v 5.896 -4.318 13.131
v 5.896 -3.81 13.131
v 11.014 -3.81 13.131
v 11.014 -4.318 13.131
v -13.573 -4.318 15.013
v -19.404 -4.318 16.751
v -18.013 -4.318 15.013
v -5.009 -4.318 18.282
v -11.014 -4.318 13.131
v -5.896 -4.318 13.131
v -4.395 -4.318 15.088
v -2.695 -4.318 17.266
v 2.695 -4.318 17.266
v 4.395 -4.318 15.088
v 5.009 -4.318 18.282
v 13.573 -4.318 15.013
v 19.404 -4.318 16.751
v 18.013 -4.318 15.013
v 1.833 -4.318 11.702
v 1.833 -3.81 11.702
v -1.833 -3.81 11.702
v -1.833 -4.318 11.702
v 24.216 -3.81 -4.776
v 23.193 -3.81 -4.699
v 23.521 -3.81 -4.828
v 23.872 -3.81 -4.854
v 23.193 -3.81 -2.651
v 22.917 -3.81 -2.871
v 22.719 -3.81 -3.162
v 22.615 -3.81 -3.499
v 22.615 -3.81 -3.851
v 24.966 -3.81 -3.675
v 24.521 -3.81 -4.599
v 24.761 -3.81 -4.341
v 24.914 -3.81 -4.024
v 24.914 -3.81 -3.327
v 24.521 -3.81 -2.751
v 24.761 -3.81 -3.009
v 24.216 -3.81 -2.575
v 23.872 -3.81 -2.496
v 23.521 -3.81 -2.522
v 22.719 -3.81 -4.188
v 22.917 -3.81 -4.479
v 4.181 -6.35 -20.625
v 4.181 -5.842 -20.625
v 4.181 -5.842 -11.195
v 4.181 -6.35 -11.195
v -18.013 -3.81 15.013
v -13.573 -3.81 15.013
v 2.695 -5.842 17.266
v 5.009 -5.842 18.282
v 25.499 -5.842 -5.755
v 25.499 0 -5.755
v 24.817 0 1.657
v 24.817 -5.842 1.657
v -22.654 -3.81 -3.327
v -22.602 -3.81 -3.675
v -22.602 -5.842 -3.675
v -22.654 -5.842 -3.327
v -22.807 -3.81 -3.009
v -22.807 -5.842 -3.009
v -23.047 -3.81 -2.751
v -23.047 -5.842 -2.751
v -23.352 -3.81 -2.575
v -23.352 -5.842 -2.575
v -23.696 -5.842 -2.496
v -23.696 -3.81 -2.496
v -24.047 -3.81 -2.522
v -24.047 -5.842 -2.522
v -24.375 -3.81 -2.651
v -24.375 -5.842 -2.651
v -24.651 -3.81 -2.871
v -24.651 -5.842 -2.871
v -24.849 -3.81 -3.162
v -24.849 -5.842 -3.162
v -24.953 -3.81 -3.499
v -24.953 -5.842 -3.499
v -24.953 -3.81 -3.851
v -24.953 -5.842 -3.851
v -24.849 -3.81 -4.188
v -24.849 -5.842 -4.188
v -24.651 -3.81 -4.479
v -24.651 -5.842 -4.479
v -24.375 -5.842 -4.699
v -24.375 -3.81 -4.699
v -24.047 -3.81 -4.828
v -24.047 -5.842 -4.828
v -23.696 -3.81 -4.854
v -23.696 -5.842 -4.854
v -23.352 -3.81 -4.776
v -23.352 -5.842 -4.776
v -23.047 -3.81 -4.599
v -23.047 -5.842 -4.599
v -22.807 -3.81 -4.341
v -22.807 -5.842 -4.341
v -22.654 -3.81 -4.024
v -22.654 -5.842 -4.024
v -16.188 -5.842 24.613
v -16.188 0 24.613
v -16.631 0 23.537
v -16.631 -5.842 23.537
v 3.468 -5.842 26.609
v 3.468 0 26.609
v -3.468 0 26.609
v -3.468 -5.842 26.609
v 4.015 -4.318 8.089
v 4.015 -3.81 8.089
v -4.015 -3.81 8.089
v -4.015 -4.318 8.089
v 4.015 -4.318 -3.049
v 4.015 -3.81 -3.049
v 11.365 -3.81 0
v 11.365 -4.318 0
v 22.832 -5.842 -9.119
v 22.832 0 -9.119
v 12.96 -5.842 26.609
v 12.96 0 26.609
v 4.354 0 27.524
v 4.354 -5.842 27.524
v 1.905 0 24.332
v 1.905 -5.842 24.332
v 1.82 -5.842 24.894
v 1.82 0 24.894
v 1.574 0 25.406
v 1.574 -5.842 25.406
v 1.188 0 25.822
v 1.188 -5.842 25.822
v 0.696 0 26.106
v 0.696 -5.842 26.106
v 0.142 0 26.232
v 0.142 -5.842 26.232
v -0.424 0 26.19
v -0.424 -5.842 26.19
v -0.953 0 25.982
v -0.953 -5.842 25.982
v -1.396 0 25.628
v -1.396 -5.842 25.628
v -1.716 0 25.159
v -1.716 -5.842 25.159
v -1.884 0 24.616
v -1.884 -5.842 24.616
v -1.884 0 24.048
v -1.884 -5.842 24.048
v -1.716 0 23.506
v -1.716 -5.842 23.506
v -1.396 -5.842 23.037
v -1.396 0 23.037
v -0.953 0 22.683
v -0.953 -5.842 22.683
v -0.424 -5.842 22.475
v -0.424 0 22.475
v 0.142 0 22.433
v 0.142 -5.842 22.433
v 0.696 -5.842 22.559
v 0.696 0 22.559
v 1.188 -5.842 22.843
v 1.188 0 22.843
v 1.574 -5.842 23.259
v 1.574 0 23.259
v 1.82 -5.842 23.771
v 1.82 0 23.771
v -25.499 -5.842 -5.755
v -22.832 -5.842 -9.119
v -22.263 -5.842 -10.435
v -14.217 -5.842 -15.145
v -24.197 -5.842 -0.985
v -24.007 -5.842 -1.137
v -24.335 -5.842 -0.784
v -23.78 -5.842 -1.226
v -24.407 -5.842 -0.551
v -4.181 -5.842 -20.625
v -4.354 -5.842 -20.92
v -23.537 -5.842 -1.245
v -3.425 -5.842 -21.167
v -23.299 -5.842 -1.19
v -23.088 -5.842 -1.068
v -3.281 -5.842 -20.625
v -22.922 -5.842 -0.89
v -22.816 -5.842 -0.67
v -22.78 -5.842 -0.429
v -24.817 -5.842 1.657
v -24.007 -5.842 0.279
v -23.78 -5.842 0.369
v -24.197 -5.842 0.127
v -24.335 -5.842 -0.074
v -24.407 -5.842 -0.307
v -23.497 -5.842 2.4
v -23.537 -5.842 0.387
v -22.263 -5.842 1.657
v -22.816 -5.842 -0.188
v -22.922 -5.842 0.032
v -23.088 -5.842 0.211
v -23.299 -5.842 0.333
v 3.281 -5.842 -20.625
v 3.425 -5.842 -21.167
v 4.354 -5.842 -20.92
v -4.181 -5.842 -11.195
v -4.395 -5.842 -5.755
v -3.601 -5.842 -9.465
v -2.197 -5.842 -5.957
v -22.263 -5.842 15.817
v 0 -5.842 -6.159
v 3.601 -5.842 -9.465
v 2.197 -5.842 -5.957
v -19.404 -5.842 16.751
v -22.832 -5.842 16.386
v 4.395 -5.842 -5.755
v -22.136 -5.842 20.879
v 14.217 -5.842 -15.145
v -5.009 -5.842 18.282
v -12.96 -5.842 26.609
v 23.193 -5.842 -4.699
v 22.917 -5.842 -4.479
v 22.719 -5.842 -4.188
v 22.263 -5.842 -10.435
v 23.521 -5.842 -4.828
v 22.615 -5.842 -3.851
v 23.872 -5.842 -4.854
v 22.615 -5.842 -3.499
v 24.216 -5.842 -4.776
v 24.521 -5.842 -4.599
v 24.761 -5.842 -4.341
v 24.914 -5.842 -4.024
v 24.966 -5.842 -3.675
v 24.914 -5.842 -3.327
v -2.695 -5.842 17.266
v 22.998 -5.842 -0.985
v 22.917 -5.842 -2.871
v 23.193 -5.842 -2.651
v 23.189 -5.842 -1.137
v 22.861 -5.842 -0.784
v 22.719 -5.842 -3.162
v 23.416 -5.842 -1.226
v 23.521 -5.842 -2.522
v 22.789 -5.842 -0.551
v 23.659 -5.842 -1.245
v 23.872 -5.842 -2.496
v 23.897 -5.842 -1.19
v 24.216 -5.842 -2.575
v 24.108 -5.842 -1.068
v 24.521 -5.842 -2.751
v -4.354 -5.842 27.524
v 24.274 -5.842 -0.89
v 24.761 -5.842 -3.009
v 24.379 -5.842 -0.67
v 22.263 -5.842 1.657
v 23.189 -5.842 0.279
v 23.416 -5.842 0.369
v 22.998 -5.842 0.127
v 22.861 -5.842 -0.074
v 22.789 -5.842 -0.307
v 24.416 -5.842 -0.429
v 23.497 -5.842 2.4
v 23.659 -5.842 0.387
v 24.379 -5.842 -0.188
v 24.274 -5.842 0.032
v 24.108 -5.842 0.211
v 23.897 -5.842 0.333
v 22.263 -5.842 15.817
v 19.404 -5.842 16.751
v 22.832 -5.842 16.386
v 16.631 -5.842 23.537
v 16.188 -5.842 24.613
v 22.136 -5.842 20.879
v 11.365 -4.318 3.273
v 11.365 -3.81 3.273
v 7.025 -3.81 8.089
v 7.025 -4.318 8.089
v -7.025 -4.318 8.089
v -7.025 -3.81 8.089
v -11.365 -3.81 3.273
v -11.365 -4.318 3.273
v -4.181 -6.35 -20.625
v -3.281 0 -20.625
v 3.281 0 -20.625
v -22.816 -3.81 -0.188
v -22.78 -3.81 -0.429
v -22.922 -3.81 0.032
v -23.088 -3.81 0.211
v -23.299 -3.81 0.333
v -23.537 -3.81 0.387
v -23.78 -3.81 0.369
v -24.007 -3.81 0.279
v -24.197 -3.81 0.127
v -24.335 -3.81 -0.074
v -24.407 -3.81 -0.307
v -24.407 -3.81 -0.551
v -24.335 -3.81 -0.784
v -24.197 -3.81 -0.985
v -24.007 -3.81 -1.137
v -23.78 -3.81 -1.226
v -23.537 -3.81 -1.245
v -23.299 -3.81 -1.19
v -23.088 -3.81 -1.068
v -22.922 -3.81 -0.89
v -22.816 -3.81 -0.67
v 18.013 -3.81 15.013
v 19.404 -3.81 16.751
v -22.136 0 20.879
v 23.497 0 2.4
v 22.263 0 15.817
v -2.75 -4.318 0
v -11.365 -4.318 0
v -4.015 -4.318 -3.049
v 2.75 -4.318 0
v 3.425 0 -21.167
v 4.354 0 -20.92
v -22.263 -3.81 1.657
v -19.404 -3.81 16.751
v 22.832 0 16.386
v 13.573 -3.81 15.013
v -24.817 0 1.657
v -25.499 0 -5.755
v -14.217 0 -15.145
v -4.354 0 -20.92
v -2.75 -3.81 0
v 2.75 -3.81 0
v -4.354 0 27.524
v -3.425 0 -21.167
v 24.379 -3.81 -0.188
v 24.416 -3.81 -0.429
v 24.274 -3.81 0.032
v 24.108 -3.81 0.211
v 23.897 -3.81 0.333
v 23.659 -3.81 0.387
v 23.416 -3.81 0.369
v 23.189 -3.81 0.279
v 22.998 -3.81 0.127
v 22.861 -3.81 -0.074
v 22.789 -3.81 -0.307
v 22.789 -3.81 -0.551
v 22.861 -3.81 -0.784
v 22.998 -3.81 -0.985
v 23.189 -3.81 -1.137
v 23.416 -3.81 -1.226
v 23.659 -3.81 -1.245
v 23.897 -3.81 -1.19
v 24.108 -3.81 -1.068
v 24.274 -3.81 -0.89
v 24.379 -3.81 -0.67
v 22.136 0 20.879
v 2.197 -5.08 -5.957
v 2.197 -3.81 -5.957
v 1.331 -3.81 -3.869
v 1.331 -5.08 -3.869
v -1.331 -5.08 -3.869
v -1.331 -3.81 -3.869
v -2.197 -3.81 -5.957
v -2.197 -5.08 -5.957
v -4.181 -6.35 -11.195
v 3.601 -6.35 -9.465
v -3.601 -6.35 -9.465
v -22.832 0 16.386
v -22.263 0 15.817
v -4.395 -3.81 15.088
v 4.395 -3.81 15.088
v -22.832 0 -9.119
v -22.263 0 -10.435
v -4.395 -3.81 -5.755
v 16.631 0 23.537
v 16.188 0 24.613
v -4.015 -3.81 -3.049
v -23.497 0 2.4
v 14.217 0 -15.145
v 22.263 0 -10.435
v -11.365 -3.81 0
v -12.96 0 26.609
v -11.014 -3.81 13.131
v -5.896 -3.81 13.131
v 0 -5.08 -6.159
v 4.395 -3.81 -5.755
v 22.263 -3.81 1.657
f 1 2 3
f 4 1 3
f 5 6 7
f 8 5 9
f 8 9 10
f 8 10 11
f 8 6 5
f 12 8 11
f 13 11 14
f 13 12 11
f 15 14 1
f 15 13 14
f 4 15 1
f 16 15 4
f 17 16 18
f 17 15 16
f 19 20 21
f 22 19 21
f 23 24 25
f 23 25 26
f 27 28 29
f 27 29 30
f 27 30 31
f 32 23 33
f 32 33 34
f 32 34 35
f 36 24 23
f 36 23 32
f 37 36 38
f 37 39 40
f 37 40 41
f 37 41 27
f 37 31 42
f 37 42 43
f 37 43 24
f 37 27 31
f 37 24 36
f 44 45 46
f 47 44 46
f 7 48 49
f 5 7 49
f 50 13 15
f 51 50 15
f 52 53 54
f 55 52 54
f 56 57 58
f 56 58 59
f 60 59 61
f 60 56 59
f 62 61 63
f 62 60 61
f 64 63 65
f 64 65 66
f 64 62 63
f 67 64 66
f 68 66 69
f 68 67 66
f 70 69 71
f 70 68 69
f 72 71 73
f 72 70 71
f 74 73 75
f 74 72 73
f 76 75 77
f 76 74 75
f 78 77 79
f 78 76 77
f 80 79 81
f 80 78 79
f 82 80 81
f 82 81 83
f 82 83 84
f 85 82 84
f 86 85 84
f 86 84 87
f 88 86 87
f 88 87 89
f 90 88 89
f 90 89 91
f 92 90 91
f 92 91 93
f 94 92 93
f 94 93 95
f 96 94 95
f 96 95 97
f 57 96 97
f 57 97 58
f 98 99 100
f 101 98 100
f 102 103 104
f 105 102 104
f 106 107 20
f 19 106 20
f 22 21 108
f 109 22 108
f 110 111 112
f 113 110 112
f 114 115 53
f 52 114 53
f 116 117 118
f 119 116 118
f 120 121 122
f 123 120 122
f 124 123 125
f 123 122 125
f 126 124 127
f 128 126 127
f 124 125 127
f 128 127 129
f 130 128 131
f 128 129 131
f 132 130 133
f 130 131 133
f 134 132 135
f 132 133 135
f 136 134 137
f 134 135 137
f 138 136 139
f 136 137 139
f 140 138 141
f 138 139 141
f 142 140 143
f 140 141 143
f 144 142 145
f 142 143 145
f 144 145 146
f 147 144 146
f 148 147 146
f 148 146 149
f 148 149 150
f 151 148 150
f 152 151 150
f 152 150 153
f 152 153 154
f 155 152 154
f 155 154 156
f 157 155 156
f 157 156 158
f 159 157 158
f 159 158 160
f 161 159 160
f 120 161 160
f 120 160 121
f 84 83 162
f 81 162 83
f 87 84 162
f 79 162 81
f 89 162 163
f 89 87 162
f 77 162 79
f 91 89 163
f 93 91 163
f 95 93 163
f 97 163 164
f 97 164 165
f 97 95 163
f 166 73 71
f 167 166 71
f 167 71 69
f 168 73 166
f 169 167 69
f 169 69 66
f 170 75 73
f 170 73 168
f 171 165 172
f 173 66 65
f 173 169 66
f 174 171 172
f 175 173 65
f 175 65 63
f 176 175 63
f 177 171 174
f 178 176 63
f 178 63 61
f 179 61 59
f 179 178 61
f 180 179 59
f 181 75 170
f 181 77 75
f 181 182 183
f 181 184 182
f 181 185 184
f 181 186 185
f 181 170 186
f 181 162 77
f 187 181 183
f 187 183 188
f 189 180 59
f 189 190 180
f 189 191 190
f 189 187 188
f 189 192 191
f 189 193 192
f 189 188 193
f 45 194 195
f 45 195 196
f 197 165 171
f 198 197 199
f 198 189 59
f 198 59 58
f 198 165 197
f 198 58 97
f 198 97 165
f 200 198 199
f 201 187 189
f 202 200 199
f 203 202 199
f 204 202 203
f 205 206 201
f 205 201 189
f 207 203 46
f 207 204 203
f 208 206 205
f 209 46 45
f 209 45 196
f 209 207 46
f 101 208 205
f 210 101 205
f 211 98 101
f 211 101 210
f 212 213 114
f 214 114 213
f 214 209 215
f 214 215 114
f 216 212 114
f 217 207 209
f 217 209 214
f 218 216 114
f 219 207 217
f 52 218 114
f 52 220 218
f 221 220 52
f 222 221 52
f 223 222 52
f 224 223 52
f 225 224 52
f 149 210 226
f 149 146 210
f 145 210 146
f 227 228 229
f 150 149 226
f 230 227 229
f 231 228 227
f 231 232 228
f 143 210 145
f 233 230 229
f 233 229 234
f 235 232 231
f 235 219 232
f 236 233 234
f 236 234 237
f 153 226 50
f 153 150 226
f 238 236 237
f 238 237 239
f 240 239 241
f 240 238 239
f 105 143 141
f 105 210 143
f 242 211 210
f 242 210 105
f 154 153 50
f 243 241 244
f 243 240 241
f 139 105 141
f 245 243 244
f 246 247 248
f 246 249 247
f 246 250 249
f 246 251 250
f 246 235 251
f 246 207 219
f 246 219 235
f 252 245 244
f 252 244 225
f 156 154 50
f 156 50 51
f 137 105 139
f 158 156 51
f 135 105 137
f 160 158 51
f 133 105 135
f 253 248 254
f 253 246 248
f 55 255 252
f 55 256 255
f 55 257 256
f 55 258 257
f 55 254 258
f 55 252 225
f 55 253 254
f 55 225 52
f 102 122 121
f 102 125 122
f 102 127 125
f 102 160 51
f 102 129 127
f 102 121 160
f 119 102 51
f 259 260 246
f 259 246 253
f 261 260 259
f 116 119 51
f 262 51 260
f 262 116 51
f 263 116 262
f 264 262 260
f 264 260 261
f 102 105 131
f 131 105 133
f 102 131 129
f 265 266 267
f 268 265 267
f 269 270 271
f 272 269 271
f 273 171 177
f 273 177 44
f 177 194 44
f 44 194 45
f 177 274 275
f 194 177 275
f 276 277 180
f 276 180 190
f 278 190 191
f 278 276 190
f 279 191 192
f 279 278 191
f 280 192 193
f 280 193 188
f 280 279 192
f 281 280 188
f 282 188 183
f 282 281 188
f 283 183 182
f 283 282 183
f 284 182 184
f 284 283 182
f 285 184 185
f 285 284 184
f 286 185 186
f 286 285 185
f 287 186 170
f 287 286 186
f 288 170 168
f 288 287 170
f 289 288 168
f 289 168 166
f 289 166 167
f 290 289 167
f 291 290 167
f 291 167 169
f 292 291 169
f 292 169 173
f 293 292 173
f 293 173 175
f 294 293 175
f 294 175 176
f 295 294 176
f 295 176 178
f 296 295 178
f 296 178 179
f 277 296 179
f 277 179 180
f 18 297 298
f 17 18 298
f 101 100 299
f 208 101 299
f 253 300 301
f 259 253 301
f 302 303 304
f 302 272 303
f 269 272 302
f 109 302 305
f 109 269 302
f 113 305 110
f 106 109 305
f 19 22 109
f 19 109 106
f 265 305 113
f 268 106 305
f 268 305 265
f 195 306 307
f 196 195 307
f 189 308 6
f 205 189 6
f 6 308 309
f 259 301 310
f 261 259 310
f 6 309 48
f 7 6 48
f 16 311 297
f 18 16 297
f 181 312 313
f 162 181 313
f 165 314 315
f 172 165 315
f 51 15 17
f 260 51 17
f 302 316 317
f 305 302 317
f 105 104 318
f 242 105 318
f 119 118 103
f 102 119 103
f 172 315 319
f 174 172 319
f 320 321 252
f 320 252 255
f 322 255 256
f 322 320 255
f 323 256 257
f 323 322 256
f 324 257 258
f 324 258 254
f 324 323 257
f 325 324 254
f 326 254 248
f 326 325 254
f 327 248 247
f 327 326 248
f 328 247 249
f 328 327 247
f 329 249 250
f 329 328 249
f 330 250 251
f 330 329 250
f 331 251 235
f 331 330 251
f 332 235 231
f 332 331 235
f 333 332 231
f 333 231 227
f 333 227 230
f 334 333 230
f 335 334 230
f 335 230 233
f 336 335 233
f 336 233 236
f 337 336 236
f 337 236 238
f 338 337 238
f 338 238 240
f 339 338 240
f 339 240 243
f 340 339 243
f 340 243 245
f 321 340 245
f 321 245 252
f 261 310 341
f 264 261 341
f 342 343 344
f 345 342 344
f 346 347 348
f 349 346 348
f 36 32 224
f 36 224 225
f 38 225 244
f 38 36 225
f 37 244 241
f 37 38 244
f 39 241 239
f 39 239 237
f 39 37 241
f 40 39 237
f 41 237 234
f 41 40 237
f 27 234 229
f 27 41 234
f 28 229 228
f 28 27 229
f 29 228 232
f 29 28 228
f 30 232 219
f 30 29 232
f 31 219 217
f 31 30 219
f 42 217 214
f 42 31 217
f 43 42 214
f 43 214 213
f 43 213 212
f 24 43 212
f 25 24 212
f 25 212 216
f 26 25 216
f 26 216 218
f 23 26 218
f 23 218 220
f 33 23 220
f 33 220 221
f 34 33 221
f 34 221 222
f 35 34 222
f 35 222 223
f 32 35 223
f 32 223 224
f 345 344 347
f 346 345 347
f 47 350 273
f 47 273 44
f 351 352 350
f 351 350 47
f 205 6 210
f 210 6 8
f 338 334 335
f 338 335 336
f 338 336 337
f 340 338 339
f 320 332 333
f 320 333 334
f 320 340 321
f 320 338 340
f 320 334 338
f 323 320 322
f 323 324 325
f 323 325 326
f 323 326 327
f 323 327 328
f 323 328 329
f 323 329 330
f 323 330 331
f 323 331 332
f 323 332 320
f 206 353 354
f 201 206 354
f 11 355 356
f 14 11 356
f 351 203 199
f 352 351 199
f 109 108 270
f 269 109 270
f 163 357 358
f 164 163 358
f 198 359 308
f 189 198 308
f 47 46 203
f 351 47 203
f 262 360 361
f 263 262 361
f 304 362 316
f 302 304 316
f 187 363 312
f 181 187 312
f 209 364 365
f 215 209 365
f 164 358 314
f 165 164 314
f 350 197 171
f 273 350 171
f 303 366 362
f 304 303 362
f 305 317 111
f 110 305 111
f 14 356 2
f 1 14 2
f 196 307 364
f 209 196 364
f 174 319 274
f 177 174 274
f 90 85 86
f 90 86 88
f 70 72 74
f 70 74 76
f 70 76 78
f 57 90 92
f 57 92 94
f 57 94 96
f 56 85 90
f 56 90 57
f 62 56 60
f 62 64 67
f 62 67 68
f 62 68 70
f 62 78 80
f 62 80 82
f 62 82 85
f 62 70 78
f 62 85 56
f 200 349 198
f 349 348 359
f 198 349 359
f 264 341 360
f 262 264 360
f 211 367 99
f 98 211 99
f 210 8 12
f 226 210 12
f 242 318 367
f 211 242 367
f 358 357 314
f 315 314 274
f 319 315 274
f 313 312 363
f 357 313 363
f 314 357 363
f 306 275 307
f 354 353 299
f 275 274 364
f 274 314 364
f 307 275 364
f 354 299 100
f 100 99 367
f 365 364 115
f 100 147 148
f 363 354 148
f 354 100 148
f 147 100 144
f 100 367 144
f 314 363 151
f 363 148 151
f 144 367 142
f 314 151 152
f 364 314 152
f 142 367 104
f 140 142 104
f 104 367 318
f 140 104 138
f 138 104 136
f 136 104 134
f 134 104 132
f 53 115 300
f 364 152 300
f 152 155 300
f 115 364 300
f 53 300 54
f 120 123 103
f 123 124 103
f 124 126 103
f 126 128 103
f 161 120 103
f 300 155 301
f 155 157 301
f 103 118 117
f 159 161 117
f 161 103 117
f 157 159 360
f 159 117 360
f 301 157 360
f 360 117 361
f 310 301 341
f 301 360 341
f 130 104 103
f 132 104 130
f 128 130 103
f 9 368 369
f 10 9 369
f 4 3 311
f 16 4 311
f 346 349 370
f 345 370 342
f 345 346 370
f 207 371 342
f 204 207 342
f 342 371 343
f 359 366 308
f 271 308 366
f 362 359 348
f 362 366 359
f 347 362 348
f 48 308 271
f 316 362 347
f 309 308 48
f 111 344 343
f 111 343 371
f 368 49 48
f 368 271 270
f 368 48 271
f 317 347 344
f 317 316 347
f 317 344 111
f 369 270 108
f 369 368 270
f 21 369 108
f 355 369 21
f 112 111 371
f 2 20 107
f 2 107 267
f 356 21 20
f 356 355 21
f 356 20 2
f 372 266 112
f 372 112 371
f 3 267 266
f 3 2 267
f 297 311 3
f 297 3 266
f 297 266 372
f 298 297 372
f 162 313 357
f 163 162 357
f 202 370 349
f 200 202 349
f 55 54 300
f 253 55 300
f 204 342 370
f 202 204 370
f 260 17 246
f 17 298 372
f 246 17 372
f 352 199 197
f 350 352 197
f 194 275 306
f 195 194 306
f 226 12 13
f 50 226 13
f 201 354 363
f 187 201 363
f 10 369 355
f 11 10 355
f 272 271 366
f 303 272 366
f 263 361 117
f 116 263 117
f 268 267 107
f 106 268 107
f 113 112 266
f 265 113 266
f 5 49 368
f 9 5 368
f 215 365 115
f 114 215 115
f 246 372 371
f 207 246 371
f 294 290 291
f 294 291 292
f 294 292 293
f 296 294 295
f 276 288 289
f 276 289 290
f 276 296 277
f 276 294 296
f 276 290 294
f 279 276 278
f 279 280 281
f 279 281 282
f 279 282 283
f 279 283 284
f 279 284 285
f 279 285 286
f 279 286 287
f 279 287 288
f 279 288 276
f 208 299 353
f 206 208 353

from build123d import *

# Parameters (mm, degrees)
F0_R     = 1.182239
F0_R_2   = 0.817997
F1_DEPTH = 5.842
F2_DEPTH = 3.81
F3_DEPTH = 5.08
F4_DEPTH = 4.318
F5_R     = 1.905
F6_DEPTH = 25.4
F7_DEPTH = 6.35


with BuildPart() as f1:
    # F0 (on Front) → F1 (new body)
    with BuildSketch(Plane.XZ):
        Polygon((-4.180855, -20.625193), (-4.353608, -20.920252), (-3.424949, -21.167446), (-3.28061, -20.625193), align=None)
        Polygon((3.424949, -21.167446), (4.353608, -20.920252), (4.180855, -20.625193), (3.28061, -20.625193), align=None)
        Polygon((22.26289, -6.835999), (22.26289, 1.657223), (4.394875, -5.754956), (2.197438, -5.957079), (0, -6.159202), (-2.197438, -5.957079), (-4.394875, -5.754956), (-22.26289, 1.657223), (-22.26289, -6.835999), (-22.832444, -9.118818), (-15.86828, -11.246894), (-14.217053, -15.145346), (-4.353608, -20.920252), (-4.180855, -20.625193), (-4.180855, -11.195441), (-3.601368, -9.465247), (0, -9.465247), (3.601368, -9.465247), (4.180855, -11.195441), (4.180855, -20.625193), (4.353608, -20.920252), (14.217053, -15.145346), (15.86828, -11.246894), (22.832444, -9.118818), align=None)
        Polygon((-15.86828, -11.246894), (-22.832444, -9.118818), (-22.26289, -10.434624), (-14.217053, -15.145346), align=None)
        Polygon((22.26289, -10.434624), (22.832444, -9.118818), (15.86828, -11.246894), (14.217053, -15.145346), align=None)
        Polygon((24.816887, 1.657223), (22.26289, 1.657223), (22.26289, -6.835999), (22.832444, -9.118818), (25.498668, -5.754956), align=None)
        with Locations((23.784082, -3.675047)):
            Circle(F0_R, mode=Mode.SUBTRACT)
        with Locations((23.597831, -0.42893)):
            Circle(F0_R_2, mode=Mode.SUBTRACT)
        Polygon((-22.26289, -6.835999), (-22.26289, 1.657223), (-24.816887, 1.657223), (-25.498668, -5.754956), (-22.832444, -9.118818), align=None)
        with Locations((-23.784082, -3.675047)):
            Circle(F0_R, mode=Mode.SUBTRACT)
        with Locations((-23.597831, -0.42893)):
            Circle(F0_R_2, mode=Mode.SUBTRACT)
        Polygon((-19.404403, 16.750786), (-22.26289, 15.816627), (-23.496922, 2.400486), (-22.26289, 1.657223), align=None)
        Polygon((23.496922, 2.400486), (22.26289, 15.816627), (19.404403, 16.750786), (22.26289, 1.657223), align=None)
        Polygon((24.816887, 1.657223), (23.496922, 2.400486), (22.26289, 1.657223), align=None)
        Polygon((-22.26289, 1.657223), (-23.496922, 2.400486), (-24.816887, 1.657223), align=None)
        Polygon((-19.404403, 16.750786), (-22.832444, 16.386179), (-22.26289, 15.816627), align=None)
        Polygon((22.26289, 15.816627), (22.832444, 16.386179), (19.404403, 16.750786), align=None)
        Polygon((22.832444, 16.386179), (22.136323, 20.879321), (5.009265, 22.700958), (2.695112, 21.684956), (0, 21.684956), (-2.695112, 21.684956), (-5.009265, 22.700958), (-22.136323, 20.879321), (-22.832444, 16.386179), (-19.404403, 16.750786), (-5.009265, 18.281856), (-2.695112, 17.265854), (0, 17.265854), (2.695112, 17.265854), (5.009265, 18.281856), (19.404403, 16.750786), align=None)
        Polygon((3.467637, 26.608711), (0, 26.608711), (-3.467637, 26.608711), (-4.353608, 27.524108), (-12.96019, 26.608711), (-16.187659, 24.61306), (-16.630644, 23.537237), (-22.136323, 20.879321), (-5.009265, 22.700958), (-2.695112, 21.684956), (0, 21.684956), (2.695112, 21.684956), (5.009265, 22.700958), (22.136323, 20.879321), (16.630644, 23.537237), (16.187659, 24.61306), (12.96019, 26.608711), (4.353608, 27.524108), align=None)
    extrude(amount=F1_DEPTH)

    # F0 (on Front) → F2 (join)
    with BuildSketch(Plane.XZ):
        with Locations((23.784082, -3.675047)):
            Circle(F0_R)
        with Locations((23.597831, -0.42893)):
            Circle(F0_R_2)
        with Locations((-23.784082, -3.675047)):
            Circle(F0_R)
        with Locations((-23.597831, -0.42893)):
            Circle(F0_R_2)
        Polygon((22.26289, 1.657223), (19.404403, 16.750786), (18.012892, 15.012917), (13.572707, 15.012917), (11.013955, 13.131482), (5.896451, 13.131482), (4.394875, 15.088174), (0, 15.088174), (-4.394875, 15.088174), (-5.896451, 13.131482), (-11.013955, 13.131482), (-13.572707, 15.012917), (-18.012892, 15.012917), (-19.404403, 16.750786), (-22.26289, 1.657223), (-4.394875, -5.754956), (-2.197438, -5.957079), (-1.331172, -3.868833), (0, -3.868833), (1.331172, -3.868833), (2.197438, -5.957079), (4.394875, -5.754956), align=None)
        Polygon((-2.750259, 0), (-4.015016, -3.048861), (-11.364689, 0), (-11.364689, 3.272761), (-7.025312, 8.089235), (-4.015016, 8.089235), (-1.832551, 11.701591), (0, 11.701591), (1.832551, 11.701591), (4.015016, 8.089235), (7.025312, 8.089235), (11.364689, 3.272761), (11.364689, 0), (4.015016, -3.048861), (2.750259, 0), (0, 0), align=None, mode=Mode.SUBTRACT)
    extrude(amount=F2_DEPTH)

    # F0 (on Front) → F3 (join)
    with BuildSketch(Plane.XZ):
        Polygon((0, -6.159202), (2.197438, -5.957079), (1.331172, -3.868833), (0, -3.868833), (-1.331172, -3.868833), (-2.197438, -5.957079), align=None)
    extrude(amount=F3_DEPTH)

    # F0 (on Front) → F4 (join)
    with BuildSketch(Plane.XZ):
        Polygon((-11.364689, 0), (-4.015016, -3.048861), (-2.750259, 0), (0, 0), (2.750259, 0), (4.015016, -3.048861), (11.364689, 0), (11.364689, 3.272761), (7.025312, 8.089235), (4.015016, 8.089235), (1.832551, 11.701591), (0, 11.701591), (-1.832551, 11.701591), (-4.015016, 8.089235), (-7.025312, 8.089235), (-11.364689, 3.272761), align=None)
        Polygon((18.012892, 15.012917), (19.404403, 16.750786), (5.009265, 18.281856), (2.695112, 17.265854), (0, 17.265854), (-2.695112, 17.265854), (-5.009265, 18.281856), (-19.404403, 16.750786), (-18.012892, 15.012917), (-13.572707, 15.012917), (-11.013955, 13.131482), (-5.896451, 13.131482), (-4.394875, 15.088174), (0, 15.088174), (4.394875, 15.088174), (5.896451, 13.131482), (11.013955, 13.131482), (13.572707, 15.012917), align=None)
    extrude(amount=F4_DEPTH)

    # F5 (on face) → F6 (cut)
    with BuildSketch(Plane.XZ.offset(5.842)):
        with Locations((0, 24.332419)):
            Circle(F5_R)
    extrude(amount=-F6_DEPTH, mode=Mode.SUBTRACT)

    # F0 (on Front) → F7 (join)
    with BuildSketch(Plane.XZ):
        Polygon((3.28061, -20.625193), (4.180855, -20.625193), (4.180855, -11.195441), (3.601368, -9.465247), (0, -9.465247), (-3.601368, -9.465247), (-4.180855, -11.195441), (-4.180855, -20.625193), (-3.28061, -20.625193), (0, -20.625193), align=None)
    extrude(amount=F7_DEPTH)


solid = f1.part
